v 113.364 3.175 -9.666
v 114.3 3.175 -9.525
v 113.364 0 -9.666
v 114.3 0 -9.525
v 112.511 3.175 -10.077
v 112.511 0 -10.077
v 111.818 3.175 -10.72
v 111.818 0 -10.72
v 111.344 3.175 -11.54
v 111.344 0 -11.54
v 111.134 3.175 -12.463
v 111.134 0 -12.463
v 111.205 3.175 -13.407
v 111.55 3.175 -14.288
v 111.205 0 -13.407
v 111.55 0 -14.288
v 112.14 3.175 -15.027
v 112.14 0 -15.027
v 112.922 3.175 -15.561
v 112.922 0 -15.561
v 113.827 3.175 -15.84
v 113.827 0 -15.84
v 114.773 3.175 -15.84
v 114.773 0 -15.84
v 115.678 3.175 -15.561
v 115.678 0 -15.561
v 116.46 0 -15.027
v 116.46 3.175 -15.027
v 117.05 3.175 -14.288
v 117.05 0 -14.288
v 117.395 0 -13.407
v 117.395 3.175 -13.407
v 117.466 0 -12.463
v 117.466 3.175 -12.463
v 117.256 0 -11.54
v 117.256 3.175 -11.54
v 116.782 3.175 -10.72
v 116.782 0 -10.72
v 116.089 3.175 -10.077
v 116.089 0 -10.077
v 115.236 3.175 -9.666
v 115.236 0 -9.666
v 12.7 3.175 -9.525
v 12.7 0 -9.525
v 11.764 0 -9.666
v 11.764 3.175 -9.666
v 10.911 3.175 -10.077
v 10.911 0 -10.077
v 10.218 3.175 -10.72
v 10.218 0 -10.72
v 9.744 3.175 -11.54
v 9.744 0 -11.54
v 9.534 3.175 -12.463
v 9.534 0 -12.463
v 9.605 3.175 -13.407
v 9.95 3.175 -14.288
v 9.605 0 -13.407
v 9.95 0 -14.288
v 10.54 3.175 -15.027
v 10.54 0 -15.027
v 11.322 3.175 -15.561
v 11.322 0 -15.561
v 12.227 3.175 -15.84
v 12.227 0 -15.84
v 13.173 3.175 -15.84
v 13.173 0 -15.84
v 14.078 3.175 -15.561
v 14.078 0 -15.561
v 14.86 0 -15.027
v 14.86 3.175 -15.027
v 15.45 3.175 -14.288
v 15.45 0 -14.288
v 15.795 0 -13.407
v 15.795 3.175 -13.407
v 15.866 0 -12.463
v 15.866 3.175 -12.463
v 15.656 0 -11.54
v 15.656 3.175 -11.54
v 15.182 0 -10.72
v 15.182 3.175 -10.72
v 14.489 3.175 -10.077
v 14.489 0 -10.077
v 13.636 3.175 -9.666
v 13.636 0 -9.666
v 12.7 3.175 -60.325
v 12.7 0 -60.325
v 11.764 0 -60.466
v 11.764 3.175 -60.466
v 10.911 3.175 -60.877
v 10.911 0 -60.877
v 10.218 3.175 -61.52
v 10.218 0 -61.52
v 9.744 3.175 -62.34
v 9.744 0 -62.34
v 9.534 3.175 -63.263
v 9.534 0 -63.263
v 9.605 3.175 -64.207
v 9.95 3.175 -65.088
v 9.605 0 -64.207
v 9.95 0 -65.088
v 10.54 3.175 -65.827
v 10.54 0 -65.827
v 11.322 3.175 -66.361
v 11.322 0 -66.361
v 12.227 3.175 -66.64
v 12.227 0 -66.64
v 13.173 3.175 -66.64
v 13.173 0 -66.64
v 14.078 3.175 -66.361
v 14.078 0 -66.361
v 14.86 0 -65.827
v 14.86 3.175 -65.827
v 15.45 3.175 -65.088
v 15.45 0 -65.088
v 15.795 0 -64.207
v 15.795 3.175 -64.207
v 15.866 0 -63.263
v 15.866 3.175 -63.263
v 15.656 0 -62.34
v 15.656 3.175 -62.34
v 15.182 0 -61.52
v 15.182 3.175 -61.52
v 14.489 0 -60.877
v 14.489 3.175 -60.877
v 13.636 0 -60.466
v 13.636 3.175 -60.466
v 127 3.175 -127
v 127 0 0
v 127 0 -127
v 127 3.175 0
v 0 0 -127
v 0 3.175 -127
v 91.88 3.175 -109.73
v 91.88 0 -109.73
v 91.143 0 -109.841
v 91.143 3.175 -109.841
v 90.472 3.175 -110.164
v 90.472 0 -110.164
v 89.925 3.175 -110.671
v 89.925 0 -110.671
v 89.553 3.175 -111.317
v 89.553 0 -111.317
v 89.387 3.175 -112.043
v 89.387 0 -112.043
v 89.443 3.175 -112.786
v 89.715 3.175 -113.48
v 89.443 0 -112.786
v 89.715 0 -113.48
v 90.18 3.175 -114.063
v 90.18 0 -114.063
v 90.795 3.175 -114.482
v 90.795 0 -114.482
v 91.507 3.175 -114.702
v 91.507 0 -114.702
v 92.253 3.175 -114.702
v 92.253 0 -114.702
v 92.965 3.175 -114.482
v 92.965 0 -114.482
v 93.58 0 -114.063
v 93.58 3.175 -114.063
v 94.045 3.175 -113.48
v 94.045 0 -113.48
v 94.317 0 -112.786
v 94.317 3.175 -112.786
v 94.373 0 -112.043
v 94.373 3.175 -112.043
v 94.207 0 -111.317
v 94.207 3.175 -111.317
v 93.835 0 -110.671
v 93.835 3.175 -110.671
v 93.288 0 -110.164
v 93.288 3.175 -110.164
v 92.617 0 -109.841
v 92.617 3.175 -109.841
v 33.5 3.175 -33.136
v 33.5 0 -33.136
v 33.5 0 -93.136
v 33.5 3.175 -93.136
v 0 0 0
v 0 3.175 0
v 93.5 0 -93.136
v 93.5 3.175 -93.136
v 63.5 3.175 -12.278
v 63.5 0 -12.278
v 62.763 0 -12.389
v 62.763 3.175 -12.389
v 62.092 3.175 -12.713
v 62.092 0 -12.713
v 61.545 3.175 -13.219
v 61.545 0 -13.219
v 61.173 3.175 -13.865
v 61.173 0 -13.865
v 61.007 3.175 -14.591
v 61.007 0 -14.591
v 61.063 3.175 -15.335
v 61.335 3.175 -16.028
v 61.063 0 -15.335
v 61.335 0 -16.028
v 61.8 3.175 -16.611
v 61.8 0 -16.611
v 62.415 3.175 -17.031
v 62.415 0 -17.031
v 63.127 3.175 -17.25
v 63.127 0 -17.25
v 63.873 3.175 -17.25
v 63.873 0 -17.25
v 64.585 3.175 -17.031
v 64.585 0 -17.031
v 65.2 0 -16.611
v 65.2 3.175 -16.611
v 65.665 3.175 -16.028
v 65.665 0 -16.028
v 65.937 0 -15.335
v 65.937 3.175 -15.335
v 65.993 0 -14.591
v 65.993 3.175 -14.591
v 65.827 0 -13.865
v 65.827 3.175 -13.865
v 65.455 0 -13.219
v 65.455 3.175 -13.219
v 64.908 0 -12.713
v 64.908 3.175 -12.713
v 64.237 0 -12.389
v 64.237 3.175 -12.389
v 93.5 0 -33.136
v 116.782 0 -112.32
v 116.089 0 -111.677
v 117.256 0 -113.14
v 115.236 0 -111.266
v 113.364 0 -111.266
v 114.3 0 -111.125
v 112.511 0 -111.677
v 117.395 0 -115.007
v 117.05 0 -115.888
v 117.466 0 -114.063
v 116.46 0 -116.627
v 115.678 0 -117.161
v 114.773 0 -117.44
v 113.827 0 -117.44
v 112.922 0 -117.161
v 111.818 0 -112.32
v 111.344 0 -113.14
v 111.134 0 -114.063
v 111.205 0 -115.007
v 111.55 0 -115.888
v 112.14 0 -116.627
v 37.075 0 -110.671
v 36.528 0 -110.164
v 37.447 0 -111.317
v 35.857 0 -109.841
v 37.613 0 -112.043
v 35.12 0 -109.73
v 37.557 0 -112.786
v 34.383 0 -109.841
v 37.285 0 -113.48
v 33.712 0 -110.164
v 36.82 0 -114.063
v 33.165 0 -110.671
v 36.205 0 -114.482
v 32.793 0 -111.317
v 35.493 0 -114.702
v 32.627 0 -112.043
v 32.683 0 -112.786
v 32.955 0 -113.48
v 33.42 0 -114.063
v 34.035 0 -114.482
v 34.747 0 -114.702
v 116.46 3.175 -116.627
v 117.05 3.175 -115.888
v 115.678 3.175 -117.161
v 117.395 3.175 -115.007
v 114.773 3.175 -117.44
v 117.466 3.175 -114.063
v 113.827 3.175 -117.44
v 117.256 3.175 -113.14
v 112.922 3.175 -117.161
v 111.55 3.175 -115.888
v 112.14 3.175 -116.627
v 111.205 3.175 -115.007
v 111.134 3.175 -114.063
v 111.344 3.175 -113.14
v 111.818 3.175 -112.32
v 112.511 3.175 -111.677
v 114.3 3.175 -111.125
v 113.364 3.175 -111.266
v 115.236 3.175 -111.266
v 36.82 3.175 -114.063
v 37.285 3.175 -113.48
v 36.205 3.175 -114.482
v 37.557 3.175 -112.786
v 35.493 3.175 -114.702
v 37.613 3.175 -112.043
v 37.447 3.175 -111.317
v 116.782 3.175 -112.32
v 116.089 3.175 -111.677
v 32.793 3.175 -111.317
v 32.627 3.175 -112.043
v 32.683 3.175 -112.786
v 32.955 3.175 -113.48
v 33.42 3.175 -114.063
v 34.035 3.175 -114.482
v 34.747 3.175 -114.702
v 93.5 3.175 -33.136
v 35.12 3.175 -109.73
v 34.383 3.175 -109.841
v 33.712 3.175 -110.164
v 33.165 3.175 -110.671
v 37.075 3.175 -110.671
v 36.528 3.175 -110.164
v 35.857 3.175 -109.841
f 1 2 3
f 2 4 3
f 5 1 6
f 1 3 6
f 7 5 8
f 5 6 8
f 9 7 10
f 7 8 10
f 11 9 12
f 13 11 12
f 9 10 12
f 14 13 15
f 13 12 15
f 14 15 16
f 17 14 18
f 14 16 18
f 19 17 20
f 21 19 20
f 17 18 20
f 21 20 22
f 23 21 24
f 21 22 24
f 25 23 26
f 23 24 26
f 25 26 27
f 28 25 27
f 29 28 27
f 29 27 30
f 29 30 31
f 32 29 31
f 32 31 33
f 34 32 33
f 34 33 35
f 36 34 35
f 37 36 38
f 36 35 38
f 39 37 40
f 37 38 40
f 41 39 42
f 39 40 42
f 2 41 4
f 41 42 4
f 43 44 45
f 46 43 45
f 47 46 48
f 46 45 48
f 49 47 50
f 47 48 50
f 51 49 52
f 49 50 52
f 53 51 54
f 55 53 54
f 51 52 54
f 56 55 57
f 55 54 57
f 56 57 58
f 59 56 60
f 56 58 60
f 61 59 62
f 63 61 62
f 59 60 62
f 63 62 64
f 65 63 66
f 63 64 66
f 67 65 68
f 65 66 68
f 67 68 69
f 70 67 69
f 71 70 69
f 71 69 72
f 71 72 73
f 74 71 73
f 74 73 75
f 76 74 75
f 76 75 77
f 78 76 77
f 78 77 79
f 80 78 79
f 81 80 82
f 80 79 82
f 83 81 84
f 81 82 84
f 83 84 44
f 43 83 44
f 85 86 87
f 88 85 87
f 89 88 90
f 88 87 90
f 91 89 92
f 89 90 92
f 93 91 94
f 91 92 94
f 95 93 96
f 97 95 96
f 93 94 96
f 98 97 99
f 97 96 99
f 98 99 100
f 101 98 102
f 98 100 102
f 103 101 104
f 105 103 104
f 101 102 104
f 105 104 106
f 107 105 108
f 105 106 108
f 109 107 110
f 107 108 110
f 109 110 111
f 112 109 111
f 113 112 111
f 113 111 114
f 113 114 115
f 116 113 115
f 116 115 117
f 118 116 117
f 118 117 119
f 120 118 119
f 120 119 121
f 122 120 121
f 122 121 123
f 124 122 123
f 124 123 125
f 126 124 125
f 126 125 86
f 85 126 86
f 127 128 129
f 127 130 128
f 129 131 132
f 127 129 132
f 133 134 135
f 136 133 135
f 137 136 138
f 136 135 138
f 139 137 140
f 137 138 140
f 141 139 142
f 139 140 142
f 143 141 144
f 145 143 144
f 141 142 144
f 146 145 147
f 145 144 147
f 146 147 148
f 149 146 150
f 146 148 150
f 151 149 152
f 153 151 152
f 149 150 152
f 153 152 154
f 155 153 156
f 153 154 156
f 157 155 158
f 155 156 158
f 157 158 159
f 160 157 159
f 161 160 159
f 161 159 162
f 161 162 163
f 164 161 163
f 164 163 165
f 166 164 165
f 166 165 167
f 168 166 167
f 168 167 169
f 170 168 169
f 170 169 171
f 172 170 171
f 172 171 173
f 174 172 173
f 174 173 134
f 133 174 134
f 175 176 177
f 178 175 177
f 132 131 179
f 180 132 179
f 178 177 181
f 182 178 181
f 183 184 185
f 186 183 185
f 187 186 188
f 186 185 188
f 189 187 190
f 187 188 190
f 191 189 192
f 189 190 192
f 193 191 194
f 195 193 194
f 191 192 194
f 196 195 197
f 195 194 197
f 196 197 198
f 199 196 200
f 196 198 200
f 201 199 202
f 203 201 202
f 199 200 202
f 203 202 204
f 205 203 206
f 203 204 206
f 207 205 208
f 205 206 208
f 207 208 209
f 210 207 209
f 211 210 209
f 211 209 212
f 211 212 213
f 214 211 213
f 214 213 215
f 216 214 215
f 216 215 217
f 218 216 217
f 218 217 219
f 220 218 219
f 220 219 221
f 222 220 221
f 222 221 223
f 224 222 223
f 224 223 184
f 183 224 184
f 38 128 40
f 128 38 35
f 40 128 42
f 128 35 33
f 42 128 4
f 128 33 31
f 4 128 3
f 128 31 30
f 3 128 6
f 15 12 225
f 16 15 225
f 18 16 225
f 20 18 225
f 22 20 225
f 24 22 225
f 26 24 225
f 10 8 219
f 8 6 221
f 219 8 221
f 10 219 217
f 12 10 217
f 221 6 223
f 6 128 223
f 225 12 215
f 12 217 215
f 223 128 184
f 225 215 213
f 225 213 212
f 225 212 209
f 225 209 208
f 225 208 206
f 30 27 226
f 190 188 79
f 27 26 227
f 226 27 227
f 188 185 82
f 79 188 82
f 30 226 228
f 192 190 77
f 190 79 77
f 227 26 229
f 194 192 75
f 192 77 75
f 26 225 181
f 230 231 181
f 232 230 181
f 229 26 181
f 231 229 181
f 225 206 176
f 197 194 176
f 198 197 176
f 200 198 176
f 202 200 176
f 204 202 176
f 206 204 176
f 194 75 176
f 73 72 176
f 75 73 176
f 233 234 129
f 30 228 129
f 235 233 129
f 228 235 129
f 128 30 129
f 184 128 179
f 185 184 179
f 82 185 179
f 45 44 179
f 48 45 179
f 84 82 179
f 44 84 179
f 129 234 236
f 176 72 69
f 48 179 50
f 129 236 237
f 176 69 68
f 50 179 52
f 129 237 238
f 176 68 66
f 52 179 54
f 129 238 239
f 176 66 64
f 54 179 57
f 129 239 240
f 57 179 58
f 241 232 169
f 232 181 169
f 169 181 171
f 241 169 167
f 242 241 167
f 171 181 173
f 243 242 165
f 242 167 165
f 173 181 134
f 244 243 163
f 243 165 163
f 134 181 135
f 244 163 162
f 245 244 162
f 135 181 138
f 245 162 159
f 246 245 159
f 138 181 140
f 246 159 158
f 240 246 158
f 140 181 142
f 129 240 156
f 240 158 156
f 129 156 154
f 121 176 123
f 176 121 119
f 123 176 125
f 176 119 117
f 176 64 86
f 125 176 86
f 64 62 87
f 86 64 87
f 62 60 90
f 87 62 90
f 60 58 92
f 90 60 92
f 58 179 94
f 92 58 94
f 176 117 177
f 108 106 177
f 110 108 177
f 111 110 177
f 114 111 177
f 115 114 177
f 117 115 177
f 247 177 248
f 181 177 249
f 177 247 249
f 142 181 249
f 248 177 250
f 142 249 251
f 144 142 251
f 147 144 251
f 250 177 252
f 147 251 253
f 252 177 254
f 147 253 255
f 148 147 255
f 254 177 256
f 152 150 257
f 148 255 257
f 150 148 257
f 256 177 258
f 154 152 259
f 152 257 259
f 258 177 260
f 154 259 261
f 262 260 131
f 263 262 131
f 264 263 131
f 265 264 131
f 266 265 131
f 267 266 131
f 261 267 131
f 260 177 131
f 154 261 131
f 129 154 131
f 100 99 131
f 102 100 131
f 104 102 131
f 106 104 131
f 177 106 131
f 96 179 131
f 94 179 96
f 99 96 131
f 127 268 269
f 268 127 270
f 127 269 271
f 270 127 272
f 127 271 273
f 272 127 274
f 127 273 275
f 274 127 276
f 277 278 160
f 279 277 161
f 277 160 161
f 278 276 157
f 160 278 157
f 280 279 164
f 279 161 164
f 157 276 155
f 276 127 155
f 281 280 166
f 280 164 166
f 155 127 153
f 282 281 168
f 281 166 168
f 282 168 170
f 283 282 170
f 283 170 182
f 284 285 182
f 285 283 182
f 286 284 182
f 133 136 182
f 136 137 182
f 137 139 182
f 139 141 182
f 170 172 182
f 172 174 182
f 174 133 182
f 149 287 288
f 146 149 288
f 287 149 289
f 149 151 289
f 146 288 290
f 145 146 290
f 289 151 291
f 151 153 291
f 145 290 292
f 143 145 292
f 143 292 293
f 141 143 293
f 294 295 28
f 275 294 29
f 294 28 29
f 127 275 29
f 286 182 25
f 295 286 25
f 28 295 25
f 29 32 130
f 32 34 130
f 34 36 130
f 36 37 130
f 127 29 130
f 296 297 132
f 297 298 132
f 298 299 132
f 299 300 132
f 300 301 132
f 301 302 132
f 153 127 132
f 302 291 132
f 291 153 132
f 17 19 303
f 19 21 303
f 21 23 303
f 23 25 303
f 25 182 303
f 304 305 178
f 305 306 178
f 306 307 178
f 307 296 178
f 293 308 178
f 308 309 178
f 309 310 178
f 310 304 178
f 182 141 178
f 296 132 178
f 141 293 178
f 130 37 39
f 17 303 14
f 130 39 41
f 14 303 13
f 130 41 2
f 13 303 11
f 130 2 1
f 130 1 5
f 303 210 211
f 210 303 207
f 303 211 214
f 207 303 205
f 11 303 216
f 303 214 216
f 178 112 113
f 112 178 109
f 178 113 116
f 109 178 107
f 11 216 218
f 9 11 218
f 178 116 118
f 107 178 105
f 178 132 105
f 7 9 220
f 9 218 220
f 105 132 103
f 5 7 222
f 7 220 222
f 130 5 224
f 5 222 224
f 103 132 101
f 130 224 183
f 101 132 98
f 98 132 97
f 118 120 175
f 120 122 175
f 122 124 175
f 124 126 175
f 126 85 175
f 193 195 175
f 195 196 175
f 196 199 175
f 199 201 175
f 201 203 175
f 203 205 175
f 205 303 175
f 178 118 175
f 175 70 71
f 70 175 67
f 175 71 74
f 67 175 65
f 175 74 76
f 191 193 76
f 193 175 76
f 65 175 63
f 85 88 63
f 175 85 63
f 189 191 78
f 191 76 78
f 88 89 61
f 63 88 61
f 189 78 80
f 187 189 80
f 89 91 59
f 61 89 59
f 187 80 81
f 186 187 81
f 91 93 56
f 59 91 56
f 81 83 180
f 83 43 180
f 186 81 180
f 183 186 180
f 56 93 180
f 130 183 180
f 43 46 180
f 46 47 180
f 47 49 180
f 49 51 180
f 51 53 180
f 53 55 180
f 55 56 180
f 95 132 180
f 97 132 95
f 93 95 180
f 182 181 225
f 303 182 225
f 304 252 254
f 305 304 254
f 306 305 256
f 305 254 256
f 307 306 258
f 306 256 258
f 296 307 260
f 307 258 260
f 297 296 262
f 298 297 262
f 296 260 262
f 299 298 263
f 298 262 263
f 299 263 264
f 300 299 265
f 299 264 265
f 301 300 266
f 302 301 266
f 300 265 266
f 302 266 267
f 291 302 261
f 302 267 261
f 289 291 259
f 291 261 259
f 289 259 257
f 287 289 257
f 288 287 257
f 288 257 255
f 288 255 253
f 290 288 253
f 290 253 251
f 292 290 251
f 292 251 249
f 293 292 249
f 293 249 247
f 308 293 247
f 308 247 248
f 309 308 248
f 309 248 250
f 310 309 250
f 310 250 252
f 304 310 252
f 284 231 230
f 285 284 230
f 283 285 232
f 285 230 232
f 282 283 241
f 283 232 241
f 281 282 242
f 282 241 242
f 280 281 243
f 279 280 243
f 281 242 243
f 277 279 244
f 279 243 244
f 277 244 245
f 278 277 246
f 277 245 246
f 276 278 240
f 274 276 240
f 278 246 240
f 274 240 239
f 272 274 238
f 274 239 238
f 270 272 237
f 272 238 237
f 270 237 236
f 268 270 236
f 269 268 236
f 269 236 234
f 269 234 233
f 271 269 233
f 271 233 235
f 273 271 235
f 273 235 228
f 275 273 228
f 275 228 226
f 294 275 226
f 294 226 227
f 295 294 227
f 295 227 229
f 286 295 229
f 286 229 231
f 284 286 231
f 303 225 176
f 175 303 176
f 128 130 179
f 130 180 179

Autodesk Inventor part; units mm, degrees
ref_plane "YZ Plane" through (0, 0, 0) normal (1, 0, 0) x (0, 1, 0)
ref_plane "XZ Plane" through (0, 0, 0) normal (0, 1, 0) x (-1, 0, 0)
ref_plane "XY Plane" through (0, 0, 0) normal (0, 0, 1) x (1, 0, 0)
sketch "Sketch2" plane through (0, 0, 0) normal (0, 1, 0) x (-1, 0, 0)
  line L0 (0, 0) -> (-101.6, 0)
  line L1 (-101.6, 0) -> (-101.6, -127)
  line L2 (-101.6, -127) -> (0, -127)
  line L3 (0, -127) -> (0, 0)
  dimension "d0" = 127
  dimension "d1" = 101.6
extrude "Extrusion1" add sketch "Sketch2" along normal blind 3.175
sketch "Sketch3" plane through (0, 3.175, 0) normal (0, 1, 0) x (1, 0, 0)
  line L0 (101.6, 127) -> (0, 127) projected
  line L1 (35.12, 112.2299) -> (63.5, 14.7782)
  line L2 (63.5, 14.7782) -> (91.88, 112.2299)
  line L3 (0, 127) -> (0, 0) projected
  line L4 (0, 0) -> (101.6, 0) projected
  dimension "d5" = 14.7701
  dimension "d6" = 14.7701
  dimension "d9" = 56.76
  dimension "d27" = 101.5
  dimension "d28" = 101.5
  dimension "d58" = 63.5
  dimension "d60" = 97.4517
  dimension "d61" = 14.7782
hole "Hole1" at (35.12, 3.175, -112.2299) at (91.88, 3.175, -112.2299) at (63.5, 3.175, -14.7782) direction (0, -1, 0) diameter 5 end through all
sketch "Sketch5" plane through (0, 0, 0) normal (0, -1, 0) x (1, 0, 0)
  circle A0 centre (91.88, -112.2299) radius 2.5 projected
  circle A1 centre (35.12, -112.2299) radius 2.5 projected
  line L0 (63.5, -63.1355) -> (91.88, -112.2299)
  line L1 (33.5, -93.1355) -> (93.5, -93.1355)
  line L2 (93.5, -93.1355) -> (93.5, -33.1355)
  line L3 (93.5, -33.1355) -> (33.5, -33.1355)
  line L4 (33.5, -33.1355) -> (33.5, -93.1355)
  line L5 (33.5, -93.1355) -> (93.5, -33.1355) construction
  line L6 (93.5, -93.1355) -> (33.5, -33.1355) construction
  dimension "d33" = 56.707
  dimension "d34" = 56.707
  dimension "d56" = 60
  dimension "d57" = 60
extrude "Extrusion2" cut sketch "Sketch5" against normal blind 25.4 contours L1 L4 L3 L2
sketch "Sketch6" plane through (101.6, 0, 0) normal (1, 0, 0) x (0, 0, -1)
  line L0 (0, 0) -> (127, 0) projected
  line L1 (127, 0) -> (127, 3.175) projected
  line L2 (0, 0) -> (127, 0)
  line L3 (127, 0) -> (127, 3.175)
  line L4 (127, 3.175) -> (0, 3.175)
  line L5 (0, 3.175) -> (0, 0)
extrude "Extrusion3" add sketch "Sketch6" along normal blind 25.4
sketch "Sketch7" plane through (0, 3.175, 0) normal (0, 1, 0) x (1, 0, 0)
  line L0 (0, 0) -> (127, 0) projected
  line L1 (127, 127) -> (127, 0) projected
  line L2 (0, 127) -> (127, 127) projected
  line L3 (0, 127) -> (0, 0) projected
  point P0 (12.7, 63.5)
  point P1 (114.3, 114.3)
  point P2 (114.3, 12.7)
  point P3 (12.7, 12.7)
  dimension "d39" = 63.5
  dimension "d40" = 12.7
  dimension "d41" = 12.7
  dimension "d42" = 12.7
  dimension "d43" = 12.7
  dimension "d44" = 12.7
  dimension "d45" = 12.7
  dimension "d46" = 113.5923
  dimension "d47" = 101.6
  dimension "d48" = 50.8
  dimension "d59" = 101.6
hole "Hole2" at (12.7, 3.175, -63.5) at (114.3, 3.175, -114.3) at (114.3, 3.175, -12.7) at (12.7, 3.175, -12.7) direction (0, -1, 0) diameter 6.35 end through all
properties part number "Window_MotorMounting" material "Aluminum 6061"
